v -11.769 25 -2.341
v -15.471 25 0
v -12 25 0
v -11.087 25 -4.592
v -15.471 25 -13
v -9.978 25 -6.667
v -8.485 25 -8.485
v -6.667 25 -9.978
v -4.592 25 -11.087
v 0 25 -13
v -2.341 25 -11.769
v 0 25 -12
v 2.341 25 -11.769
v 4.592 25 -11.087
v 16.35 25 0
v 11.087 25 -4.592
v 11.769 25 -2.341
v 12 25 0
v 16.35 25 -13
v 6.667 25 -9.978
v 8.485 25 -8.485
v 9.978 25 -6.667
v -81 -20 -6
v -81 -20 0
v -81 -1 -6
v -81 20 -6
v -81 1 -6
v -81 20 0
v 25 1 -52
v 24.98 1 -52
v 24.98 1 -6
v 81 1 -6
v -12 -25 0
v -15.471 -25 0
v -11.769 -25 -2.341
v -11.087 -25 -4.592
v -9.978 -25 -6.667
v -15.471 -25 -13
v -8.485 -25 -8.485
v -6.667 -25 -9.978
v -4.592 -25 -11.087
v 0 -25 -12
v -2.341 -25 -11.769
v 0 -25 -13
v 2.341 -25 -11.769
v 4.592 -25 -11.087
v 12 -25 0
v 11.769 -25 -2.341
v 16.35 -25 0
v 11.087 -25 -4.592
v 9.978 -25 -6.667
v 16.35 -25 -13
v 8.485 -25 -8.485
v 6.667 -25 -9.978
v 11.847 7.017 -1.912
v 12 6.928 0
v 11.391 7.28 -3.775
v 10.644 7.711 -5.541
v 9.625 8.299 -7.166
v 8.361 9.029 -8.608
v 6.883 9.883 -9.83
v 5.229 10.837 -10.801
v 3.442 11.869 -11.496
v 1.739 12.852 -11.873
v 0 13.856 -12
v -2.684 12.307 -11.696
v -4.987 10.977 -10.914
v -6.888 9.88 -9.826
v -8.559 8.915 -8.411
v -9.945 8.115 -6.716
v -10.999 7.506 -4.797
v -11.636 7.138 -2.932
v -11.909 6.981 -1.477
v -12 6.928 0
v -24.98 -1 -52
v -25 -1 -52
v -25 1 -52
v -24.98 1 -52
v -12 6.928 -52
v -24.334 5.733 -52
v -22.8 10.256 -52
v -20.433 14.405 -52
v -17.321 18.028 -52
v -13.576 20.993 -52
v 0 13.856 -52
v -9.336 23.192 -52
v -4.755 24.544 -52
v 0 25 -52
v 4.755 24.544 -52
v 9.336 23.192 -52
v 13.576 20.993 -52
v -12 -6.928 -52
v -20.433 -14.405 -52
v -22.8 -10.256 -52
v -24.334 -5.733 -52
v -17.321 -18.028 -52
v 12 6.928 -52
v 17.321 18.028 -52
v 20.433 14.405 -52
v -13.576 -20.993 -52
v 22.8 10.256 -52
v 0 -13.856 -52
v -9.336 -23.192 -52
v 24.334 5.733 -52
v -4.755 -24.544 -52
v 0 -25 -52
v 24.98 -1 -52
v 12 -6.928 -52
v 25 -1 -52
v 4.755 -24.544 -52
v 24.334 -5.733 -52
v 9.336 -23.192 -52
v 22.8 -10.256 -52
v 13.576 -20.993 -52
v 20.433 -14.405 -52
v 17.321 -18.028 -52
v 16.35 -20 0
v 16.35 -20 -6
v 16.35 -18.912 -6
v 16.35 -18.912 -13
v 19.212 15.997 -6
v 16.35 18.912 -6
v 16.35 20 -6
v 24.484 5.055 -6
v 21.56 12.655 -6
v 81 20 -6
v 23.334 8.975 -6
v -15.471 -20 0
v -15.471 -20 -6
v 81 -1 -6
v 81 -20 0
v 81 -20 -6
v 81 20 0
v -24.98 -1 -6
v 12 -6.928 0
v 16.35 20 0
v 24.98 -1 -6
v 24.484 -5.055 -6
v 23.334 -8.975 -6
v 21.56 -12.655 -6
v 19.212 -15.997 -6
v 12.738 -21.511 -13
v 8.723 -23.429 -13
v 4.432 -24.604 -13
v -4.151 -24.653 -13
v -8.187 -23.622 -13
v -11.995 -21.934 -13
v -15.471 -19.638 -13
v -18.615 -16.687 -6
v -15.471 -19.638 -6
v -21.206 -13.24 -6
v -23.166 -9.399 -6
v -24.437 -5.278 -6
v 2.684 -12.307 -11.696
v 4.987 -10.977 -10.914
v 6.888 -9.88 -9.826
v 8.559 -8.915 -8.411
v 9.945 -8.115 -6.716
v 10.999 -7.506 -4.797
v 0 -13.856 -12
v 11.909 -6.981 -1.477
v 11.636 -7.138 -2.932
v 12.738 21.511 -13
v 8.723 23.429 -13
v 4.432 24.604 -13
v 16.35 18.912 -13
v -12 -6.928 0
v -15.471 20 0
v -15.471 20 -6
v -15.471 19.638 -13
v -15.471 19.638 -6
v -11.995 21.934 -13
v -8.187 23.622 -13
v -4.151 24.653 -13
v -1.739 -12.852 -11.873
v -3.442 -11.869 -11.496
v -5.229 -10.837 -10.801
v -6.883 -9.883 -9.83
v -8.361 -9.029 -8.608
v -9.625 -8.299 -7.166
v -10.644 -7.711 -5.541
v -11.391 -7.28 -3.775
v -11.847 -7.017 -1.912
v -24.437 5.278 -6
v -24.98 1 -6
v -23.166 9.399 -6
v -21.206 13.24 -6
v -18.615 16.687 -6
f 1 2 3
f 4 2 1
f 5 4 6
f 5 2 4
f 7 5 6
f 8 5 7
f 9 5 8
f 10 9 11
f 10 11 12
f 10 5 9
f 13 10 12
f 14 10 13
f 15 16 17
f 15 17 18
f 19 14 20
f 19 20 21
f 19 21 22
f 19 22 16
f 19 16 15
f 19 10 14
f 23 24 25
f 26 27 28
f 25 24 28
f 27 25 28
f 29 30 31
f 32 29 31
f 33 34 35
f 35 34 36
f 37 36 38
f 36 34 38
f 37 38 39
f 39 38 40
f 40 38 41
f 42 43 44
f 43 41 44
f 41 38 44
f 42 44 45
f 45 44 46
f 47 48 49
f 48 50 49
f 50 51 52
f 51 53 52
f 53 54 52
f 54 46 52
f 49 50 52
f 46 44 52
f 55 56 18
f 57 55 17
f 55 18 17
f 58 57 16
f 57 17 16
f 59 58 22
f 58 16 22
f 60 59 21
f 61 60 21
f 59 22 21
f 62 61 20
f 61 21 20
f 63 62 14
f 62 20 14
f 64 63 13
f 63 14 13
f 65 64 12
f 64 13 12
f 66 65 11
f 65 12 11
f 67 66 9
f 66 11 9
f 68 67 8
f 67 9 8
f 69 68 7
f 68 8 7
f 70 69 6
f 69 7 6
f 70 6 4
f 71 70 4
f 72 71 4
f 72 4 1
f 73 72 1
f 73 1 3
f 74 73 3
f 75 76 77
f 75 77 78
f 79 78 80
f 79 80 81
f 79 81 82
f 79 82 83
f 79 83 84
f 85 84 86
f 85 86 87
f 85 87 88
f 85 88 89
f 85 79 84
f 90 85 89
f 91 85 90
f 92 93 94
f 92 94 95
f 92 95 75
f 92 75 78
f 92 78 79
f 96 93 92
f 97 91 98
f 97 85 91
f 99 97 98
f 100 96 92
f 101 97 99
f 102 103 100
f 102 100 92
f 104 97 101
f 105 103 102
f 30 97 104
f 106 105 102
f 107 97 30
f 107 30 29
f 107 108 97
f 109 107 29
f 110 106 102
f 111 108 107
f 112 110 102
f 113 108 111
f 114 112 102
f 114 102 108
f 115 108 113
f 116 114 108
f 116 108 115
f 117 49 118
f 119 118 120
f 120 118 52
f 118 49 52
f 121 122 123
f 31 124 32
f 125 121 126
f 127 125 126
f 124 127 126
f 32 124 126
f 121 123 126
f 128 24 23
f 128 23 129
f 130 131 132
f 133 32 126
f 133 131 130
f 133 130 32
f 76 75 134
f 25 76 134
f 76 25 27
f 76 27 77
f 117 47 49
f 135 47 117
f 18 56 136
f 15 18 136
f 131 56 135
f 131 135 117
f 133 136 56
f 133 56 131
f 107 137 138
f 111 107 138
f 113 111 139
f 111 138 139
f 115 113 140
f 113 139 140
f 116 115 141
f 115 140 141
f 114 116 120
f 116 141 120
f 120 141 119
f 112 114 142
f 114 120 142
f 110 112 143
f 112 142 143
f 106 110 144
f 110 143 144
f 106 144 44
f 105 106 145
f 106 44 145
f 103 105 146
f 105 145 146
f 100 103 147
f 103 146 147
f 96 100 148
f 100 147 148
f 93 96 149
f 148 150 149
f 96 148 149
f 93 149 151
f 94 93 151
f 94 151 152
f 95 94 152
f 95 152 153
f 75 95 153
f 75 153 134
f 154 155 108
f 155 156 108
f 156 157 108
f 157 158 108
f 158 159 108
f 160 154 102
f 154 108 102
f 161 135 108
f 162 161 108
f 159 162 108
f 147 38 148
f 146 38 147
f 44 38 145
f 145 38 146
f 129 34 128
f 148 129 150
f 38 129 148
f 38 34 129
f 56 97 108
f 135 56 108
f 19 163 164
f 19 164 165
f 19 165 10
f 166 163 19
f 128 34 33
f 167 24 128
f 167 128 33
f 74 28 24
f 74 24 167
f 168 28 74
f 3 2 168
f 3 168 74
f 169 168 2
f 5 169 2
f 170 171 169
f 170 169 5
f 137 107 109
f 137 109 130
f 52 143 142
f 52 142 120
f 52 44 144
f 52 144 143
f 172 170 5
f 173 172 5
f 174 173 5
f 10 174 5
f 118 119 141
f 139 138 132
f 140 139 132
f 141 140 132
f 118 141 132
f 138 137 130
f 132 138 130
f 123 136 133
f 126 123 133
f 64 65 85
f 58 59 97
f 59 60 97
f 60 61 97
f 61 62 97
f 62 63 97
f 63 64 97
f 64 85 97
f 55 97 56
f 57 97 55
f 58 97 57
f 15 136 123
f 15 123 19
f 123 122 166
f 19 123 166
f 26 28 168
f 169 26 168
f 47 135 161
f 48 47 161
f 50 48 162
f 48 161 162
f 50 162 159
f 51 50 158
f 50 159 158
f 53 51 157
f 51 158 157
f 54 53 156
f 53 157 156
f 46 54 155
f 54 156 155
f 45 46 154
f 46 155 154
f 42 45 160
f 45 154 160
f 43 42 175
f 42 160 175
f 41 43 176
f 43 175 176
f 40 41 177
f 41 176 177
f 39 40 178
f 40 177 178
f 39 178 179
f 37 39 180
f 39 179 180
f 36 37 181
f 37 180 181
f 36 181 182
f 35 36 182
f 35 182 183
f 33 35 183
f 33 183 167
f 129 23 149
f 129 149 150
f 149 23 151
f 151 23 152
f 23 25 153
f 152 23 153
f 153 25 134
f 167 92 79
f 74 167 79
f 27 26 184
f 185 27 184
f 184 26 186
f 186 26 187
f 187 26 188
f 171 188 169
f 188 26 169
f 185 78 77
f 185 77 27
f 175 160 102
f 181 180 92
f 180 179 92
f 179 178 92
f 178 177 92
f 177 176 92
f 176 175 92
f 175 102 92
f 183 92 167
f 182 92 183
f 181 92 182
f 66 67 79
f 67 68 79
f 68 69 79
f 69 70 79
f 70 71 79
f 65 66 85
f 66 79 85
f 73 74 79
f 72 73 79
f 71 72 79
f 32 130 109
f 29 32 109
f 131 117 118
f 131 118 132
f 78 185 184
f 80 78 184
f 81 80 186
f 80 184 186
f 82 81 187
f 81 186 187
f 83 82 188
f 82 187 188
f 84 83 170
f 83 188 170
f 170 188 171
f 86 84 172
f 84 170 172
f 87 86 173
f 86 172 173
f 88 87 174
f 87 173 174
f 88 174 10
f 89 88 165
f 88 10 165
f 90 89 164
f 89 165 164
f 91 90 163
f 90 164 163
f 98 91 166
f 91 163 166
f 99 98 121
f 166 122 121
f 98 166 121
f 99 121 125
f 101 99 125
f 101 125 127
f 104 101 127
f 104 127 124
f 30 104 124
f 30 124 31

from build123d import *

# Parameters (mm, degrees)
SKETCH1_W                = 162
SKETCH1_H                = 40
BOSS_EXTRUDE1_DEPTH      = 6
BOSS_EXTRUDE2_START      = -20
SKETCH2_W                = 31.820776168
SKETCH2_H                = 13
BOSS_EXTRUDE2_DEPTH      = 25
CUT_EXTRUDE1_DEPTH       = 97.072888996
BOSS_EXTRUDE3_DEPTH      = 39
BOSS_EXTRUDE3_DEPTH_BACK = 7
SKETCH4_R                = 25
SKETCH5_R                = 12
CUT_EXTRUDE3_DEPTH       = 109.466584762
CUT_EXTRUDE4_DEPTH       = 100.448479124
RIB5_START               = -1
RIB5_DEPTH               = 2


with BuildPart() as part:
    # Sketch1 → Boss-Extrude1 (new body)
    with BuildSketch(Plane.XY):
        Rectangle(SKETCH1_W, SKETCH1_H)
    extrude(amount=-BOSS_EXTRUDE1_DEPTH)

    # Sketch2 → Boss-Extrude2 (add)
    with BuildSketch(Plane(origin=(0, 20, 0), x_dir=(1, 0, 0), z_dir=(0, 1, 0)).offset(BOSS_EXTRUDE2_START)):
        with Locations((0.439513483, 6.5)):
            Rectangle(SKETCH2_W, SKETCH2_H)
    boss_extrude2 = extrude(amount=BOSS_EXTRUDE2_DEPTH)

    # Mirror1: Boss-Extrude2 across plane
    add(boss_extrude2.mirror(Plane.ZX))

    # Sketch3 → Cut-Extrude1 (cut, through all)
    with BuildSketch(Plane(origin=(0, 25, 0), x_dir=(1, 0, 0), z_dir=(0, 1, 0))):
        with BuildLine():
            Line((-12, 0), (12, 0))
            ThreePointArc((12, 0), (0, 12), (-12, 0))
        make_face()
    extrude(amount=-CUT_EXTRUDE1_DEPTH, mode=Mode.SUBTRACT)

    # Sketch4 → Boss-Extrude3 (add, two sides: drawn at the far end of the back side and taken through both)
    with BuildSketch(Plane(origin=(0, 0, -13), x_dir=(-1, 0, 0), z_dir=(0, 0, -1)).offset(-BOSS_EXTRUDE3_DEPTH_BACK)):
        Circle(SKETCH4_R)
    extrude(amount=BOSS_EXTRUDE3_DEPTH + BOSS_EXTRUDE3_DEPTH_BACK)

    # Sketch5 → Cut-Extrude3 (cut, through all)
    with BuildSketch(Plane.XZ.offset(25)):
        Circle(SKETCH5_R)
    extrude(amount=-CUT_EXTRUDE3_DEPTH, mode=Mode.SUBTRACT)

    # Sketch6 → Cut-Extrude4 (cut, through all)
    with BuildSketch(Plane(origin=(0, 0, -52), x_dir=(-1, 0, 0), z_dir=(0, 0, -1))):
        Polygon((0, 13.856406461), (-12, 6.92820323), (-12, -6.92820323), (0, -13.856406461), (12, -6.92820323), (12, 6.92820323), align=None)
    extrude(amount=-CUT_EXTRUDE4_DEPTH, mode=Mode.SUBTRACT)

    # Rib5: read off the stored shape, not the designer's step
    # Rib5 outline → Rib5 (add)
    with BuildSketch(Plane(origin=(0, 0, 0), x_dir=(1, 0, 0), z_dir=(0, 1, 0)).offset(RIB5_START)):
        Polygon((81, 6), (25, 52), (24.979991994, 52), (24.979991994, 6), align=None)
    rib5 = extrude(amount=RIB5_DEPTH)

    # Mirror2: Rib5 across plane
    add(rib5.mirror(Plane(origin=(0, 0, 0), x_dir=(0, 0, 1), z_dir=(1, 0, 0))))


solid = part.part
